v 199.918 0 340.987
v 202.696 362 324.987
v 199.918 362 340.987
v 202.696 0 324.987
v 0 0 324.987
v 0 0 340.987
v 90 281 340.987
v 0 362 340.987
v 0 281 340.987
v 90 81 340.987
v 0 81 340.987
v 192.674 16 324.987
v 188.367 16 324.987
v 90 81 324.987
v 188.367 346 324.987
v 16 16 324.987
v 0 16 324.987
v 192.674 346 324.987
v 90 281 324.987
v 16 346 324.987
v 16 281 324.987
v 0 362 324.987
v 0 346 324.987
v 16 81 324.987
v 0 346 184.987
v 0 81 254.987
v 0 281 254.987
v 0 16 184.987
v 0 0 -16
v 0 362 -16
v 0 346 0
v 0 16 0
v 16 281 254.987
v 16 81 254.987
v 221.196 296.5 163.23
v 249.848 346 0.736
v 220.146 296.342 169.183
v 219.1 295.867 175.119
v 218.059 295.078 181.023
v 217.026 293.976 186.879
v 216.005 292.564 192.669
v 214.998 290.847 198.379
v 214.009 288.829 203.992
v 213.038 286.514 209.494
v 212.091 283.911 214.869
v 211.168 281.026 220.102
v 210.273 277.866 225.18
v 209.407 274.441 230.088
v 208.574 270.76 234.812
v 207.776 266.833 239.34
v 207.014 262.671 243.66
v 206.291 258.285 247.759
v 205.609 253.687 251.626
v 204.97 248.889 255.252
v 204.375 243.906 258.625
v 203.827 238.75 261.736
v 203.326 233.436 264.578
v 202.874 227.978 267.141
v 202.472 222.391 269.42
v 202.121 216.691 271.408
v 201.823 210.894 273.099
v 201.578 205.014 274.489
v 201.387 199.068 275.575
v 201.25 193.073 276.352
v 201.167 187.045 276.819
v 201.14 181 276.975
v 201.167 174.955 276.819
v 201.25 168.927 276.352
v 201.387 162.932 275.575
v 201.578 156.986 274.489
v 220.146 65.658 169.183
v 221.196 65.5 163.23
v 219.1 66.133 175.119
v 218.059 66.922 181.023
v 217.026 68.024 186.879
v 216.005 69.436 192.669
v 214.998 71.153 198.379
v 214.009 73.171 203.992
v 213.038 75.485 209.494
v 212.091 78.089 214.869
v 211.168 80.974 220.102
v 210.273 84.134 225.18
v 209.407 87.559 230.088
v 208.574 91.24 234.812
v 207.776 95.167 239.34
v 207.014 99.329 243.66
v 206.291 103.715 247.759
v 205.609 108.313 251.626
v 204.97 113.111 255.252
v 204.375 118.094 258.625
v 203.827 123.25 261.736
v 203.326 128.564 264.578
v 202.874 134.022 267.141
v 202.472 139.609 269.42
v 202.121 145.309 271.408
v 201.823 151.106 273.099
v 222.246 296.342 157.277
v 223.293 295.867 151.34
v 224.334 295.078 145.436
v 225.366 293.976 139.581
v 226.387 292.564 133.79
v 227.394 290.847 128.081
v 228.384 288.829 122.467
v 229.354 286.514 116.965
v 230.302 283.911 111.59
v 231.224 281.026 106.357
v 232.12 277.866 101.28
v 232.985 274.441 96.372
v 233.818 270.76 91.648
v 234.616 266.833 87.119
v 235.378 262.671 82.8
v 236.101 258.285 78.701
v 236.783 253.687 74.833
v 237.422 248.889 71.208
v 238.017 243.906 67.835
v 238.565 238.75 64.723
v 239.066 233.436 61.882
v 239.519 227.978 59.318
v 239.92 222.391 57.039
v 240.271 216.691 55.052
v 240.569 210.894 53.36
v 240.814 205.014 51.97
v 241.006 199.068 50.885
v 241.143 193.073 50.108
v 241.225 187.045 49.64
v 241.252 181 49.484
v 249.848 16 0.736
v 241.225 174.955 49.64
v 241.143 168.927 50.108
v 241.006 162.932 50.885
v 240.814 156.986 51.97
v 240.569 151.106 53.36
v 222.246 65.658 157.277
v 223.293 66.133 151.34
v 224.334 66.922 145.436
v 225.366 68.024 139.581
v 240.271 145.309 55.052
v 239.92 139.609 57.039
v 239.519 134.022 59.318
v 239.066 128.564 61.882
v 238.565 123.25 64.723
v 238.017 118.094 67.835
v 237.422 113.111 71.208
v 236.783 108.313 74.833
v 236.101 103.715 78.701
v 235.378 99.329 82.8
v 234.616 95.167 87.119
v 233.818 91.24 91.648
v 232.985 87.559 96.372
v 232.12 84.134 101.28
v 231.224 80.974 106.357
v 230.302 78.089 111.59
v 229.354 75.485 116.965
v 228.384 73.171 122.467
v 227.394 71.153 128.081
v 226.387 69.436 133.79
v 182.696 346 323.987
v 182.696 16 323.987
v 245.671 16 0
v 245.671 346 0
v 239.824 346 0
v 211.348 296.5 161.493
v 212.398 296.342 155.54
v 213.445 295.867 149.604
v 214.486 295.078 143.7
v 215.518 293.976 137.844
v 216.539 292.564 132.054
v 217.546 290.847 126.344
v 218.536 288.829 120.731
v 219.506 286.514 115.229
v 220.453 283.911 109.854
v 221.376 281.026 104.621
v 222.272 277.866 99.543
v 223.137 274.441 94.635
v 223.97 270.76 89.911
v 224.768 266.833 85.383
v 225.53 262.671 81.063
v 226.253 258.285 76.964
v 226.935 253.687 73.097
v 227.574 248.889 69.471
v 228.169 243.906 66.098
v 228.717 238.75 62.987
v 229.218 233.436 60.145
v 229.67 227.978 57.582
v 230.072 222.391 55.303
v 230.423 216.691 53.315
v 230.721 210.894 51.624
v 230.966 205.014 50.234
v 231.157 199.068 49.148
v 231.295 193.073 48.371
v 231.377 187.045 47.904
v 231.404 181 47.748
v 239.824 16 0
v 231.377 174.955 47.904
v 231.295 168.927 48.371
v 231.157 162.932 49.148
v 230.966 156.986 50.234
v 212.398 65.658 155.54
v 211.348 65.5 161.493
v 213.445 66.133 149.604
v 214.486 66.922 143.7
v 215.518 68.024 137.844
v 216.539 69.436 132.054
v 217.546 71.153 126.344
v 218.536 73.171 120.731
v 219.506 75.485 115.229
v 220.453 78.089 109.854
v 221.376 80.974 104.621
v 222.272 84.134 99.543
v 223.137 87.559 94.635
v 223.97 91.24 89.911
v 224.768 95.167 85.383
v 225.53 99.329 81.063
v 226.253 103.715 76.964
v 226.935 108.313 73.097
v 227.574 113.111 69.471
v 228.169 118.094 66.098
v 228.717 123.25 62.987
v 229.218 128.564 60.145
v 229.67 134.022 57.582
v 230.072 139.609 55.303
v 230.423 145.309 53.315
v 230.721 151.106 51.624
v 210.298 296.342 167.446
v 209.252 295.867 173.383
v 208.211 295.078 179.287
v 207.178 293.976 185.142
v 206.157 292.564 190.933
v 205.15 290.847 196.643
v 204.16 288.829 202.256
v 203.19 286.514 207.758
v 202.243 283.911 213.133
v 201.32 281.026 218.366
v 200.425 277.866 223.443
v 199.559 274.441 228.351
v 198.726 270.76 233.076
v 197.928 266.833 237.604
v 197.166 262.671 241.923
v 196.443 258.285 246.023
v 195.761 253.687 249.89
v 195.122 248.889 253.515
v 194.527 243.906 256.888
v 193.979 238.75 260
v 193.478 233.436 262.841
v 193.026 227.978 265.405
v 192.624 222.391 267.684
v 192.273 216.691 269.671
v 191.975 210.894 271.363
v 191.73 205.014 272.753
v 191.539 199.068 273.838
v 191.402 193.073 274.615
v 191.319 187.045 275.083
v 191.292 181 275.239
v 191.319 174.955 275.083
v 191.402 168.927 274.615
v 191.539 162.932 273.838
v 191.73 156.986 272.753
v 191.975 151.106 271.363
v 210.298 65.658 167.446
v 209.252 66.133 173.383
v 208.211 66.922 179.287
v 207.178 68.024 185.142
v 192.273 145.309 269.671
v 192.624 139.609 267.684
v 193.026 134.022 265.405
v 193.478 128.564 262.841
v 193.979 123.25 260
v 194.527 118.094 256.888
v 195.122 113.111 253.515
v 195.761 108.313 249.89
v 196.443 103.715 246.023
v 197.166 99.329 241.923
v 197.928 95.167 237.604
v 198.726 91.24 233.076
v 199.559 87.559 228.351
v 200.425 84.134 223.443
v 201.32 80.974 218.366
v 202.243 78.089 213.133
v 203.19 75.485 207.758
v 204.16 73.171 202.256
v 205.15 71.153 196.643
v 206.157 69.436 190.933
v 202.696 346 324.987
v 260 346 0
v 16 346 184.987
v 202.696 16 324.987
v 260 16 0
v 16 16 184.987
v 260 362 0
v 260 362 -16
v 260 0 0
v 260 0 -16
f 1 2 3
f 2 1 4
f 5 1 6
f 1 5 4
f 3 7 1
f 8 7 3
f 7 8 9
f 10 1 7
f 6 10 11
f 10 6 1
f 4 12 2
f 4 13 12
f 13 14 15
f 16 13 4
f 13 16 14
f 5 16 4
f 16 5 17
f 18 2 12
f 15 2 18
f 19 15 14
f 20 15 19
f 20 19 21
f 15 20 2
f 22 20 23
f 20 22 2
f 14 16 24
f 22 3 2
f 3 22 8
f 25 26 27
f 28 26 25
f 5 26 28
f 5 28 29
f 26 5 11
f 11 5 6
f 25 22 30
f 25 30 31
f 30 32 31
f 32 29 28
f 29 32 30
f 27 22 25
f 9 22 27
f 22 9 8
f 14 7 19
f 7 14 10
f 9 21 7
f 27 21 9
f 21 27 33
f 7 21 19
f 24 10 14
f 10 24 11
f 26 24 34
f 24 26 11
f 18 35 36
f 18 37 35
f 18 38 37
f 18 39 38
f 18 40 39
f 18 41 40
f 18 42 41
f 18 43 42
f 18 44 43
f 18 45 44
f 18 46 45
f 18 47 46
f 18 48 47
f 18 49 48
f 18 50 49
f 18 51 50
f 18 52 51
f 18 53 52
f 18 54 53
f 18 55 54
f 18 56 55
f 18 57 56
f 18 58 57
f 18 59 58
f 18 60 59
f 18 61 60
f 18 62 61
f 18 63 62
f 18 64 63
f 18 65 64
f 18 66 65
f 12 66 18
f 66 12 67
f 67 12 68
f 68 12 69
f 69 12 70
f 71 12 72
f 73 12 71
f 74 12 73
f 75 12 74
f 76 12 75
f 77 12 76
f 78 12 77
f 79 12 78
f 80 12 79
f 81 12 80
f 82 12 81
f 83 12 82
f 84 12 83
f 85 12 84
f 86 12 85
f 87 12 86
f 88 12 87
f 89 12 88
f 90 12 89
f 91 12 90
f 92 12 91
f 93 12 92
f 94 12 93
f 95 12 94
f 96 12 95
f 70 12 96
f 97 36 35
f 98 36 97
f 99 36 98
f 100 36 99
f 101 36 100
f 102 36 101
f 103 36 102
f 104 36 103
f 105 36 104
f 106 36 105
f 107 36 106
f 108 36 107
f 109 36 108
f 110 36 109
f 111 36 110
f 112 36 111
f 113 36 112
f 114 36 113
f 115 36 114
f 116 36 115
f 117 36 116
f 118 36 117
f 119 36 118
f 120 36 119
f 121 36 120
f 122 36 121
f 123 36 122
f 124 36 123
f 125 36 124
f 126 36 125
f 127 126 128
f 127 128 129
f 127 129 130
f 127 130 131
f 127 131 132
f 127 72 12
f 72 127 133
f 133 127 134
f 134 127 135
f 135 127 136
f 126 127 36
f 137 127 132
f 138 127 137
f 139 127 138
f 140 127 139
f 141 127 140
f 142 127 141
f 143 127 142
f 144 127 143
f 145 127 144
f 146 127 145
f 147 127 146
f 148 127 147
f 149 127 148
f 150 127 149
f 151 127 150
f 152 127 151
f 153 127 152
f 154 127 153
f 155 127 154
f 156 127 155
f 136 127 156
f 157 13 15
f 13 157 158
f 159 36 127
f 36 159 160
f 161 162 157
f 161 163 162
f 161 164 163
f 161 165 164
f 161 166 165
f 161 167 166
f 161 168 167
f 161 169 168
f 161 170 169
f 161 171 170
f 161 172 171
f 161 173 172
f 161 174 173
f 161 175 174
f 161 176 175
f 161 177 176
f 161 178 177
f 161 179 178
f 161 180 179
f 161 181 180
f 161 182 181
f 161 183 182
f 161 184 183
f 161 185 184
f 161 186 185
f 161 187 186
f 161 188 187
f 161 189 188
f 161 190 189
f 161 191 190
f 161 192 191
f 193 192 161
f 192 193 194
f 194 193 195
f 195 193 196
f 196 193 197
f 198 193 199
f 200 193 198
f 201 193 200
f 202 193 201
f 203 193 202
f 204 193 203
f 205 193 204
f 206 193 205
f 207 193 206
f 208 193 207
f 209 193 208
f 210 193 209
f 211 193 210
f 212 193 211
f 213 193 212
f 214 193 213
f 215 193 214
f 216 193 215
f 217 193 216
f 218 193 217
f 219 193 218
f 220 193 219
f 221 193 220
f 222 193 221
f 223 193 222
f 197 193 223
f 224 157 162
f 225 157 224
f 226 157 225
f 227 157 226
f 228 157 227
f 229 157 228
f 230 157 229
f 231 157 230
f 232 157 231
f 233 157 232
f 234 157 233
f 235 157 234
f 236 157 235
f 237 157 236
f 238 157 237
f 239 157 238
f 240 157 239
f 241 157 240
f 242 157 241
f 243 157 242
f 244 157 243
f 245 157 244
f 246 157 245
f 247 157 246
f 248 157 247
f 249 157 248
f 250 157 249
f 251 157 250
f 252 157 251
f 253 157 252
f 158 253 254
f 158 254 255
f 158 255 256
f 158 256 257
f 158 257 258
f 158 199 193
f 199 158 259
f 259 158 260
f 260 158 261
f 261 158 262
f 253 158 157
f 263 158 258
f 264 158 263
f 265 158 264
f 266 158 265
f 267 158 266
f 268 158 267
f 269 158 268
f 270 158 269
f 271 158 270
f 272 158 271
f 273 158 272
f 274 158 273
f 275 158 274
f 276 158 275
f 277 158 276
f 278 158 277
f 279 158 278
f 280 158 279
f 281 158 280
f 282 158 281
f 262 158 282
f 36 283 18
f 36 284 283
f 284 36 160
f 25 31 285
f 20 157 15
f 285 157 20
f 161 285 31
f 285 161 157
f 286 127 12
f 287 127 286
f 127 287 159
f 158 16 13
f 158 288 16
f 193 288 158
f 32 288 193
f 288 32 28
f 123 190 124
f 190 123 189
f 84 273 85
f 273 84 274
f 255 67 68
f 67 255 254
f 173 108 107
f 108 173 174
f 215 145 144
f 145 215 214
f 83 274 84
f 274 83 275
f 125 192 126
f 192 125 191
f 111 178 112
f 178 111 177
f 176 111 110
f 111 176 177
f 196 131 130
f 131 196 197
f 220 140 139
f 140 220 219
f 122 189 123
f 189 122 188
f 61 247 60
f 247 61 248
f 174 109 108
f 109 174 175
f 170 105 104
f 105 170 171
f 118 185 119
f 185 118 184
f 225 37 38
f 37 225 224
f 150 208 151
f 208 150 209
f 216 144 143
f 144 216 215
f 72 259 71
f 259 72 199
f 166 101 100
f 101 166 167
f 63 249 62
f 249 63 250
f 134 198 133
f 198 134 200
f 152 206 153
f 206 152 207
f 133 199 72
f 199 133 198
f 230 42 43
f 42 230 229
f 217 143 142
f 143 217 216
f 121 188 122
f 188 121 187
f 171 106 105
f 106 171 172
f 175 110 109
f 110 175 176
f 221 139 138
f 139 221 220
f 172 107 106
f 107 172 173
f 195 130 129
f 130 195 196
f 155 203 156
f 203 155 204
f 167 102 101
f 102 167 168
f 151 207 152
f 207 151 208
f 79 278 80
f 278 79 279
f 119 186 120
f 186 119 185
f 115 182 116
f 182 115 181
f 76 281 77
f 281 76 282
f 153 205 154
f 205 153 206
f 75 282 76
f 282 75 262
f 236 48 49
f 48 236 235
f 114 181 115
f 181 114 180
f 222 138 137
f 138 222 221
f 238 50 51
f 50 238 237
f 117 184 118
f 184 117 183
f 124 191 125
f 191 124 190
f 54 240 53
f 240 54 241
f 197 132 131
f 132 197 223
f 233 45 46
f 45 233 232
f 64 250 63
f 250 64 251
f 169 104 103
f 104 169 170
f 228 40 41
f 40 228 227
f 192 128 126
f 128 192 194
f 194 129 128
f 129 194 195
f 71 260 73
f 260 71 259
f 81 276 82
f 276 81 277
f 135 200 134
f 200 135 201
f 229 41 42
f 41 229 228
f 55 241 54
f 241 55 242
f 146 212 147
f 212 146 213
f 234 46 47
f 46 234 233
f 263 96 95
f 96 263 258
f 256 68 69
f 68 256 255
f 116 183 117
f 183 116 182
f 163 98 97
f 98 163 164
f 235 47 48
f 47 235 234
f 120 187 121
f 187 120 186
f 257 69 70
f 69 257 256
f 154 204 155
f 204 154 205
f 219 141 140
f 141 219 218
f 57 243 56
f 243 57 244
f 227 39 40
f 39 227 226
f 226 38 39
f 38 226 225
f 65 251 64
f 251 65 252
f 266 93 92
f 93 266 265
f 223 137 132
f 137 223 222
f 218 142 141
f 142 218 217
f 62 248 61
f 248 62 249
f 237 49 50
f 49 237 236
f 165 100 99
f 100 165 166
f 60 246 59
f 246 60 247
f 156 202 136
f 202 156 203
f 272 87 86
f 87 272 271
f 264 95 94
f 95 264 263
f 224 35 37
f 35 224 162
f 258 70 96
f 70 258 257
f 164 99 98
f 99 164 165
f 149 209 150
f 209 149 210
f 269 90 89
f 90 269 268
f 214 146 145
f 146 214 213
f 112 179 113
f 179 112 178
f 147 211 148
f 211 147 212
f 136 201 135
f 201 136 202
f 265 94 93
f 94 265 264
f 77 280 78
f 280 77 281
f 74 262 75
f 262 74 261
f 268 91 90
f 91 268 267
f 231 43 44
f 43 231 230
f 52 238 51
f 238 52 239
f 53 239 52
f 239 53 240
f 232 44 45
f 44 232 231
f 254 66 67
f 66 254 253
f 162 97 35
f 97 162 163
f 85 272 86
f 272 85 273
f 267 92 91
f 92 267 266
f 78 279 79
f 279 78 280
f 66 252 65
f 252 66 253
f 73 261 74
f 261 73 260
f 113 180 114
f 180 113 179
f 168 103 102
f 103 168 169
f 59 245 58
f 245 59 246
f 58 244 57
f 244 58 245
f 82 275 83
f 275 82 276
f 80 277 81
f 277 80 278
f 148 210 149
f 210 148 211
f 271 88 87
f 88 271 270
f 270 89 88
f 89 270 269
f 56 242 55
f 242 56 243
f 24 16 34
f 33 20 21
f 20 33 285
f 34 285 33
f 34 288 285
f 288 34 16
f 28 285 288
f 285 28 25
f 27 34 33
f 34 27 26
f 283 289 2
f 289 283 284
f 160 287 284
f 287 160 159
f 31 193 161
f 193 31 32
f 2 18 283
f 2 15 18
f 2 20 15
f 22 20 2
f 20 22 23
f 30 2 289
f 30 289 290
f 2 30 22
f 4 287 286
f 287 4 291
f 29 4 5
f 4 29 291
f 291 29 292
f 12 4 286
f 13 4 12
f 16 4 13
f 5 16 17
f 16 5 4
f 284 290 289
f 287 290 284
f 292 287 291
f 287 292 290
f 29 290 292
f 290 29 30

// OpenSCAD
// file: modulo3_common.scad
module top()
{
	difference()
	{
		top_offset = sin(angle) * thick;

		rotate([-90, 0, 0])
			linear_extrude(baffle_size + thick*2)
				polygon([	[0, 0],
							[0, thick],
							[in_depth - offset, thick],
							[in_depth - offset - top_offset, 0]]);

		translate([0, thick + (baffle_size - ctr_width) / 2, -1 - thick])
			cube([ctr_depth, ctr_width, thick + 2]);
	}
}

module baffle()
{
	difference()
	{
		cube([baffle_thick, baffle_size, baffle_size]);

		translate([-1, baffle_size/2, baffle_size/2])
			rotate([0, 90, 0])
				cylinder(baffle_thick + 2, speaker_hole, speaker_hole);
	}
}
// main file
include <modulo3_common.scad>

$fn = 120;

thick = 16;
baffle_thick = 10;
baffle_size = 330;
in_depth = 260;
speaker_hole = 231/2;

ctr_width = 200;
ctr_depth = 90;
ctr_height = 70;

angle = 10;

back_height = 140;

in_height	= cos(angle) * baffle_size;
offset		= sin(angle) * baffle_size;

vol_side	= (in_height * in_depth - in_height * offset / 2) * thick;
vol_top		= ((in_depth - offset) * (baffle_size + thick*2) - (ctr_depth * ctr_width)) * thick;
vol_bottom	= in_depth * (baffle_size + thick*2) * thick;
vol_baffle	= (baffle_size * baffle_size - speaker_hole * speaker_hole * 3.1416) * baffle_thick;
vol_back	= (baffle_size * back_height - ctr_width * ctr_height) * thick;
vol_all		= (vol_side + vol_top + vol_bottom + vol_baffle + vol_back) / 1000;

echo("******************************");
echo("volume cm3 = ", vol_all);
echo("walnut kg = ", vol_all * 0.57 / 1000);
echo("pine kg = ", vol_all * 0.42 / 1000);

translate([0, baffle_size + thick*2, 0])
	side();

translate([0, thick, 0])
	side();
	
// bottom
translate([0, 0, -thick])
	cube([in_depth, baffle_size + thick*2, thick]);

translate([0, 0, in_height + thick])
	top();

translate([in_depth - baffle_thick*2, thick, -1])
	rotate([0, -angle, 0])
		baffle();

translate([0, thick, in_height - back_height])
	upper_back();

module upper_back()
{
	difference()
	{
		cube([thick, baffle_size, back_height]);
		
		translate([-1, (baffle_size - ctr_width) / 2, back_height - ctr_height])
			cube([thick + 2, ctr_width, ctr_height]);
	}
}

module side()
{
	rotate([90, 0, 0])
		linear_extrude(thick)
			polygon([	[0, 0],
						[in_depth, 0],
						[in_depth - offset, in_height],
						[0, in_height]]);
}
